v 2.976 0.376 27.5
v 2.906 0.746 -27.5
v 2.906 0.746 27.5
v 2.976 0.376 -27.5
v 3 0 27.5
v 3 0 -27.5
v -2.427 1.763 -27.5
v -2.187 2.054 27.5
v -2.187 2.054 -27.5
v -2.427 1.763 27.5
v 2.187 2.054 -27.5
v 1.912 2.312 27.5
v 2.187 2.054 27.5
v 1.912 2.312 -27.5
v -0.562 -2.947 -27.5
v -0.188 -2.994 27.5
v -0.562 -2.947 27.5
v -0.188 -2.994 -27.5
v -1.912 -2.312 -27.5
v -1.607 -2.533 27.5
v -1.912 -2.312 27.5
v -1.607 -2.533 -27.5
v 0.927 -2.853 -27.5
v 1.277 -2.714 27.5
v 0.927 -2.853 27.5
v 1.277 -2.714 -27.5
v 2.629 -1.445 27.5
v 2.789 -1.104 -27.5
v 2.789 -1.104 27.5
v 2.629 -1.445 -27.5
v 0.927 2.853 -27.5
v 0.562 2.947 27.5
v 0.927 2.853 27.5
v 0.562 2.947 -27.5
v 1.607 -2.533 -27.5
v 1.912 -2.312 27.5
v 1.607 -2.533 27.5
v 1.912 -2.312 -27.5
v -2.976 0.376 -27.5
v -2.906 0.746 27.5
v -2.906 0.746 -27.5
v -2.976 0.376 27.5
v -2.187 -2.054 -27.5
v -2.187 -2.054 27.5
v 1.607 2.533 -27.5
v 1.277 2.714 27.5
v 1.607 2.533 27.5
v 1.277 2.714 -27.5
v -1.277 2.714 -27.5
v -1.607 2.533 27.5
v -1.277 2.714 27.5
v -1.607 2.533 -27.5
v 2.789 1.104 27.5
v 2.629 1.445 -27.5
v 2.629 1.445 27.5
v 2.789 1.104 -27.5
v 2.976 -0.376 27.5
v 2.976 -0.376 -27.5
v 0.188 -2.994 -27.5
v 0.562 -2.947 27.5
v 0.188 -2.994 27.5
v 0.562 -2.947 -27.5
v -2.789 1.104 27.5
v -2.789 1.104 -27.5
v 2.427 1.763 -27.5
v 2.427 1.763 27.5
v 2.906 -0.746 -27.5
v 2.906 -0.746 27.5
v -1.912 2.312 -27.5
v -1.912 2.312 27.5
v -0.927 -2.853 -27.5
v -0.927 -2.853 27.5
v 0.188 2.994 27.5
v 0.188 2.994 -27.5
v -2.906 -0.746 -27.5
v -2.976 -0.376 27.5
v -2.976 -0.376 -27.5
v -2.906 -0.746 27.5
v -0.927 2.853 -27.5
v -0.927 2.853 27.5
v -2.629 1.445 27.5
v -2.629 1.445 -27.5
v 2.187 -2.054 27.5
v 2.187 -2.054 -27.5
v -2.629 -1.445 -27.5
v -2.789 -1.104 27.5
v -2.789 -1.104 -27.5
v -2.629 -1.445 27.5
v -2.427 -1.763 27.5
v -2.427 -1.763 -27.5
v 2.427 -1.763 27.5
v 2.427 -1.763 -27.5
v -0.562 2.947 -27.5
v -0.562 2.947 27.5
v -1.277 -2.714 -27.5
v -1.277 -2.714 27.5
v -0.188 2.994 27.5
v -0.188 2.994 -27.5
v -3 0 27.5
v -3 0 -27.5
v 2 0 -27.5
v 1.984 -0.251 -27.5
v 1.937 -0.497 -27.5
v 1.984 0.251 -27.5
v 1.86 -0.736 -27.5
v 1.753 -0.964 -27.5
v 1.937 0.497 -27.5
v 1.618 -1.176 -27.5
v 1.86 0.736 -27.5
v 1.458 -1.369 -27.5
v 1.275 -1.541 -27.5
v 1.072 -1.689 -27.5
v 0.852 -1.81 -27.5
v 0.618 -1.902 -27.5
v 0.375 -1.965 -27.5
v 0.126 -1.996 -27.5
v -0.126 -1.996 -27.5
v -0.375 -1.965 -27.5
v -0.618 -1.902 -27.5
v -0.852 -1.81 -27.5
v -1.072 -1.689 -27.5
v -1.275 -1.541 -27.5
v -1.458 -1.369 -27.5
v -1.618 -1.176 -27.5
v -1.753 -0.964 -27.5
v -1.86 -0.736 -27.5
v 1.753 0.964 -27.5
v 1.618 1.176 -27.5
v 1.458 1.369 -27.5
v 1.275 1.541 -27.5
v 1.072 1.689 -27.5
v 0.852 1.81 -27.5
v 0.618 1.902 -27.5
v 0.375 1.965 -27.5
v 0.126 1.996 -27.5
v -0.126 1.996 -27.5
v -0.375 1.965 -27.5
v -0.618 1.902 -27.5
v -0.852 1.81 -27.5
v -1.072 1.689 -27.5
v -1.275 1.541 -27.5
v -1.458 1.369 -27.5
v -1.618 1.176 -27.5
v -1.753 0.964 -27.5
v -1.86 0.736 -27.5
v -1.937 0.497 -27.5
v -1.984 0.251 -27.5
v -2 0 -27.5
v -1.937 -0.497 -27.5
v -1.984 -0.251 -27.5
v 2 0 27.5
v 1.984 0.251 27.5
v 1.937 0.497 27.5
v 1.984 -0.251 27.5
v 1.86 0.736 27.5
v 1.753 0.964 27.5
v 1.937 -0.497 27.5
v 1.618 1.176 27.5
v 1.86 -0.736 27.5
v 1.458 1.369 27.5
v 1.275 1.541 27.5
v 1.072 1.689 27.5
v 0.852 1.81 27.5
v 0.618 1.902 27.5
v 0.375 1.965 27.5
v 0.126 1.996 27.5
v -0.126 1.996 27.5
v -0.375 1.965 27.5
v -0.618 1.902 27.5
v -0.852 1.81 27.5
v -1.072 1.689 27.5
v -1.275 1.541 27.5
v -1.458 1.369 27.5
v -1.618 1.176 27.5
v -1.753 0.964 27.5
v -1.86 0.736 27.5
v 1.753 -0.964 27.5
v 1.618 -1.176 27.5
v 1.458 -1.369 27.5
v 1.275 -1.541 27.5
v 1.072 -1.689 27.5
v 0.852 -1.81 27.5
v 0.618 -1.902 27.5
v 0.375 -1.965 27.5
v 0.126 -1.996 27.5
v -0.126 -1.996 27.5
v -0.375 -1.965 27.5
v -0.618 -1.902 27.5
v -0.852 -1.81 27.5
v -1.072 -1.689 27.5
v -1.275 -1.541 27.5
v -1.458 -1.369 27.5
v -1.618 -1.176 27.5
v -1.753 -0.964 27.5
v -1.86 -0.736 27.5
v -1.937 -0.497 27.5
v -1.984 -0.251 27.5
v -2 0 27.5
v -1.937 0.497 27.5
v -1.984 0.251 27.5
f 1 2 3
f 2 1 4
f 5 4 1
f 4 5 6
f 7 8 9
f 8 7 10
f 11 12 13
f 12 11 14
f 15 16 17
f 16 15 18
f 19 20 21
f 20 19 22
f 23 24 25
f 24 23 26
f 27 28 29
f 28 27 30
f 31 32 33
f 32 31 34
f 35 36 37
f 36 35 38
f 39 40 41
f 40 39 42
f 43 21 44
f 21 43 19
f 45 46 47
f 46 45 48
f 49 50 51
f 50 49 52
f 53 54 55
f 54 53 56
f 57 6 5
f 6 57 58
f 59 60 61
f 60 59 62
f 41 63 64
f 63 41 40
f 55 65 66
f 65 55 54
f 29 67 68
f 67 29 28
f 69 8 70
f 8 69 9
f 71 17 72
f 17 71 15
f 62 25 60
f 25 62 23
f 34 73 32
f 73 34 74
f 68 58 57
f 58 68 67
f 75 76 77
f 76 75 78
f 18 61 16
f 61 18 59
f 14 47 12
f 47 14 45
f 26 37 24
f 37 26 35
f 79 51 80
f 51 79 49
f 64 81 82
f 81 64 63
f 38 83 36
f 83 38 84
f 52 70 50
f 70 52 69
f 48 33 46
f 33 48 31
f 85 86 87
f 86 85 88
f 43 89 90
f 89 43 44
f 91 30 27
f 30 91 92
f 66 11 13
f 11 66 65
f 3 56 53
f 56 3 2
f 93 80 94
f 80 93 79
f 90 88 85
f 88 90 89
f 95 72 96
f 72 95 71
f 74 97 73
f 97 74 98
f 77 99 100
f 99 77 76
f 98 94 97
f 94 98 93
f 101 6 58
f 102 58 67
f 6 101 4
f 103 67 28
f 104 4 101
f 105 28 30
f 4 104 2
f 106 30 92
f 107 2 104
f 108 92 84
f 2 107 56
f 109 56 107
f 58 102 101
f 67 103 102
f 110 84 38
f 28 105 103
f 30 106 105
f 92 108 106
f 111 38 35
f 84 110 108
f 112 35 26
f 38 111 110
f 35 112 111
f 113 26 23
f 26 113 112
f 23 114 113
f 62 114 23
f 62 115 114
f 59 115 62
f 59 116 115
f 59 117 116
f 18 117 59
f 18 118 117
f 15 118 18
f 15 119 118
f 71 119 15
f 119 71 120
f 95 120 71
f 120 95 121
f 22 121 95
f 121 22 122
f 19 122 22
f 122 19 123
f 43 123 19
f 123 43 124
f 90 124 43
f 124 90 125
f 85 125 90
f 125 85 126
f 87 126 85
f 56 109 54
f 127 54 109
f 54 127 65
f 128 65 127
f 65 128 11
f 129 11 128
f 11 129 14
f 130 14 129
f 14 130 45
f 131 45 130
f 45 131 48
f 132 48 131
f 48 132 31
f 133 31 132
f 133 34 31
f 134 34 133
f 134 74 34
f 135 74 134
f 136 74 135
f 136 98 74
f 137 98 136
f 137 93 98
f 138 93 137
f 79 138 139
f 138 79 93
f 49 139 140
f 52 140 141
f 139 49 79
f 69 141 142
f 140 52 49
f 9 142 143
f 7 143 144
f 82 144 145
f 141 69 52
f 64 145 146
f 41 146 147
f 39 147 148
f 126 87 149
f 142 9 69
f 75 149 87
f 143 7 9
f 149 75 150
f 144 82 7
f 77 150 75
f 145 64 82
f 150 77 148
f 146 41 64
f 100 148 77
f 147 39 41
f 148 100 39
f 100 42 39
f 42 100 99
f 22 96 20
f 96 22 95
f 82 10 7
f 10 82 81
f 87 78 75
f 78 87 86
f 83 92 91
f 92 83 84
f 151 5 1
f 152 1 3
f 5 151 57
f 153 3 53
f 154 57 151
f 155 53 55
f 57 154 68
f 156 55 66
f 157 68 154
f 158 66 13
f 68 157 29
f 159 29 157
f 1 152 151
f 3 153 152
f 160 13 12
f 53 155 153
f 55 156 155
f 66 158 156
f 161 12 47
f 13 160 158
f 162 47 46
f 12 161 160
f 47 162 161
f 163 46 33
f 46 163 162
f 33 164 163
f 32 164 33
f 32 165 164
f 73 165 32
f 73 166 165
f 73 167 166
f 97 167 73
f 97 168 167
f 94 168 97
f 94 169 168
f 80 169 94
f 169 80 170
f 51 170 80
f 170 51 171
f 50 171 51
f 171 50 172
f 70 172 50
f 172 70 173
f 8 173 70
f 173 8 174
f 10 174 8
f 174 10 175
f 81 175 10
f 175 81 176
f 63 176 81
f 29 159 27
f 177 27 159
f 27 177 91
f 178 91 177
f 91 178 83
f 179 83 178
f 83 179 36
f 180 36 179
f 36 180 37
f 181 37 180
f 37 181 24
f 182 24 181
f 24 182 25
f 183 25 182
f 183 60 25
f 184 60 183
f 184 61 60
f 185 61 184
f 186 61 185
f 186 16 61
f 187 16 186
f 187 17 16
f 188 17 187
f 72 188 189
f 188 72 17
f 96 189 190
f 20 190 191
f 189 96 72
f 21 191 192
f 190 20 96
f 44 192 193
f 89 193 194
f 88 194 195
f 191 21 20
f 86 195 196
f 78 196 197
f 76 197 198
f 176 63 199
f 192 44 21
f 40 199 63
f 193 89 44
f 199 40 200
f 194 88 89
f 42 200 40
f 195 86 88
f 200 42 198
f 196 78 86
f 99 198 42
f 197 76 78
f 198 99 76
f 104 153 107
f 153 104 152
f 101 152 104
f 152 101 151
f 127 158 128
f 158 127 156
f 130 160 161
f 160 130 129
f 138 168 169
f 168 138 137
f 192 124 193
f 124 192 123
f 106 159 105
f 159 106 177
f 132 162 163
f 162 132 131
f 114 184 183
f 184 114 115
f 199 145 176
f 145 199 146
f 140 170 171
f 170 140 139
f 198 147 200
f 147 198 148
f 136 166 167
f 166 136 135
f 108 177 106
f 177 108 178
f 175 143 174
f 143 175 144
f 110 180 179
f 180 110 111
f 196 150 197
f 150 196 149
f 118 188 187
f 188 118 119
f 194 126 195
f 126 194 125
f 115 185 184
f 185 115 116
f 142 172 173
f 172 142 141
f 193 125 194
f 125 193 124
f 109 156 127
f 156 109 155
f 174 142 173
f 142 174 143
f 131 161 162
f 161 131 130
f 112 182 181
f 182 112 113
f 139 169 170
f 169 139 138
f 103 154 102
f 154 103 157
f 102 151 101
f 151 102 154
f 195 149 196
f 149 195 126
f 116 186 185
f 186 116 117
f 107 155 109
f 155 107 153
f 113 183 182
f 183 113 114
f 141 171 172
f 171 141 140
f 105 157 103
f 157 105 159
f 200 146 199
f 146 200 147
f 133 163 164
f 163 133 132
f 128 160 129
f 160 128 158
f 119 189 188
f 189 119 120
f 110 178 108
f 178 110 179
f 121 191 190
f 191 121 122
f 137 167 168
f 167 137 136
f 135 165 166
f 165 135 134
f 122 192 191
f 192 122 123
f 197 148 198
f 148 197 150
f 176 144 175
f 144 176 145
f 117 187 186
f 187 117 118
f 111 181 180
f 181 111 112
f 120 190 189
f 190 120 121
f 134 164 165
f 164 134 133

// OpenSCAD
$fn = 50;


difference() {
	union() {
		translate(v = [0, 0, -27.5000000000]) {
			cylinder(h = 55, r = 3.0000000000);
		}
	}
	union() {
		translate(v = [0, 0, -100.0000000000]) {
			cylinder(h = 200, r = 2.0000000000);
		}
	}
}
